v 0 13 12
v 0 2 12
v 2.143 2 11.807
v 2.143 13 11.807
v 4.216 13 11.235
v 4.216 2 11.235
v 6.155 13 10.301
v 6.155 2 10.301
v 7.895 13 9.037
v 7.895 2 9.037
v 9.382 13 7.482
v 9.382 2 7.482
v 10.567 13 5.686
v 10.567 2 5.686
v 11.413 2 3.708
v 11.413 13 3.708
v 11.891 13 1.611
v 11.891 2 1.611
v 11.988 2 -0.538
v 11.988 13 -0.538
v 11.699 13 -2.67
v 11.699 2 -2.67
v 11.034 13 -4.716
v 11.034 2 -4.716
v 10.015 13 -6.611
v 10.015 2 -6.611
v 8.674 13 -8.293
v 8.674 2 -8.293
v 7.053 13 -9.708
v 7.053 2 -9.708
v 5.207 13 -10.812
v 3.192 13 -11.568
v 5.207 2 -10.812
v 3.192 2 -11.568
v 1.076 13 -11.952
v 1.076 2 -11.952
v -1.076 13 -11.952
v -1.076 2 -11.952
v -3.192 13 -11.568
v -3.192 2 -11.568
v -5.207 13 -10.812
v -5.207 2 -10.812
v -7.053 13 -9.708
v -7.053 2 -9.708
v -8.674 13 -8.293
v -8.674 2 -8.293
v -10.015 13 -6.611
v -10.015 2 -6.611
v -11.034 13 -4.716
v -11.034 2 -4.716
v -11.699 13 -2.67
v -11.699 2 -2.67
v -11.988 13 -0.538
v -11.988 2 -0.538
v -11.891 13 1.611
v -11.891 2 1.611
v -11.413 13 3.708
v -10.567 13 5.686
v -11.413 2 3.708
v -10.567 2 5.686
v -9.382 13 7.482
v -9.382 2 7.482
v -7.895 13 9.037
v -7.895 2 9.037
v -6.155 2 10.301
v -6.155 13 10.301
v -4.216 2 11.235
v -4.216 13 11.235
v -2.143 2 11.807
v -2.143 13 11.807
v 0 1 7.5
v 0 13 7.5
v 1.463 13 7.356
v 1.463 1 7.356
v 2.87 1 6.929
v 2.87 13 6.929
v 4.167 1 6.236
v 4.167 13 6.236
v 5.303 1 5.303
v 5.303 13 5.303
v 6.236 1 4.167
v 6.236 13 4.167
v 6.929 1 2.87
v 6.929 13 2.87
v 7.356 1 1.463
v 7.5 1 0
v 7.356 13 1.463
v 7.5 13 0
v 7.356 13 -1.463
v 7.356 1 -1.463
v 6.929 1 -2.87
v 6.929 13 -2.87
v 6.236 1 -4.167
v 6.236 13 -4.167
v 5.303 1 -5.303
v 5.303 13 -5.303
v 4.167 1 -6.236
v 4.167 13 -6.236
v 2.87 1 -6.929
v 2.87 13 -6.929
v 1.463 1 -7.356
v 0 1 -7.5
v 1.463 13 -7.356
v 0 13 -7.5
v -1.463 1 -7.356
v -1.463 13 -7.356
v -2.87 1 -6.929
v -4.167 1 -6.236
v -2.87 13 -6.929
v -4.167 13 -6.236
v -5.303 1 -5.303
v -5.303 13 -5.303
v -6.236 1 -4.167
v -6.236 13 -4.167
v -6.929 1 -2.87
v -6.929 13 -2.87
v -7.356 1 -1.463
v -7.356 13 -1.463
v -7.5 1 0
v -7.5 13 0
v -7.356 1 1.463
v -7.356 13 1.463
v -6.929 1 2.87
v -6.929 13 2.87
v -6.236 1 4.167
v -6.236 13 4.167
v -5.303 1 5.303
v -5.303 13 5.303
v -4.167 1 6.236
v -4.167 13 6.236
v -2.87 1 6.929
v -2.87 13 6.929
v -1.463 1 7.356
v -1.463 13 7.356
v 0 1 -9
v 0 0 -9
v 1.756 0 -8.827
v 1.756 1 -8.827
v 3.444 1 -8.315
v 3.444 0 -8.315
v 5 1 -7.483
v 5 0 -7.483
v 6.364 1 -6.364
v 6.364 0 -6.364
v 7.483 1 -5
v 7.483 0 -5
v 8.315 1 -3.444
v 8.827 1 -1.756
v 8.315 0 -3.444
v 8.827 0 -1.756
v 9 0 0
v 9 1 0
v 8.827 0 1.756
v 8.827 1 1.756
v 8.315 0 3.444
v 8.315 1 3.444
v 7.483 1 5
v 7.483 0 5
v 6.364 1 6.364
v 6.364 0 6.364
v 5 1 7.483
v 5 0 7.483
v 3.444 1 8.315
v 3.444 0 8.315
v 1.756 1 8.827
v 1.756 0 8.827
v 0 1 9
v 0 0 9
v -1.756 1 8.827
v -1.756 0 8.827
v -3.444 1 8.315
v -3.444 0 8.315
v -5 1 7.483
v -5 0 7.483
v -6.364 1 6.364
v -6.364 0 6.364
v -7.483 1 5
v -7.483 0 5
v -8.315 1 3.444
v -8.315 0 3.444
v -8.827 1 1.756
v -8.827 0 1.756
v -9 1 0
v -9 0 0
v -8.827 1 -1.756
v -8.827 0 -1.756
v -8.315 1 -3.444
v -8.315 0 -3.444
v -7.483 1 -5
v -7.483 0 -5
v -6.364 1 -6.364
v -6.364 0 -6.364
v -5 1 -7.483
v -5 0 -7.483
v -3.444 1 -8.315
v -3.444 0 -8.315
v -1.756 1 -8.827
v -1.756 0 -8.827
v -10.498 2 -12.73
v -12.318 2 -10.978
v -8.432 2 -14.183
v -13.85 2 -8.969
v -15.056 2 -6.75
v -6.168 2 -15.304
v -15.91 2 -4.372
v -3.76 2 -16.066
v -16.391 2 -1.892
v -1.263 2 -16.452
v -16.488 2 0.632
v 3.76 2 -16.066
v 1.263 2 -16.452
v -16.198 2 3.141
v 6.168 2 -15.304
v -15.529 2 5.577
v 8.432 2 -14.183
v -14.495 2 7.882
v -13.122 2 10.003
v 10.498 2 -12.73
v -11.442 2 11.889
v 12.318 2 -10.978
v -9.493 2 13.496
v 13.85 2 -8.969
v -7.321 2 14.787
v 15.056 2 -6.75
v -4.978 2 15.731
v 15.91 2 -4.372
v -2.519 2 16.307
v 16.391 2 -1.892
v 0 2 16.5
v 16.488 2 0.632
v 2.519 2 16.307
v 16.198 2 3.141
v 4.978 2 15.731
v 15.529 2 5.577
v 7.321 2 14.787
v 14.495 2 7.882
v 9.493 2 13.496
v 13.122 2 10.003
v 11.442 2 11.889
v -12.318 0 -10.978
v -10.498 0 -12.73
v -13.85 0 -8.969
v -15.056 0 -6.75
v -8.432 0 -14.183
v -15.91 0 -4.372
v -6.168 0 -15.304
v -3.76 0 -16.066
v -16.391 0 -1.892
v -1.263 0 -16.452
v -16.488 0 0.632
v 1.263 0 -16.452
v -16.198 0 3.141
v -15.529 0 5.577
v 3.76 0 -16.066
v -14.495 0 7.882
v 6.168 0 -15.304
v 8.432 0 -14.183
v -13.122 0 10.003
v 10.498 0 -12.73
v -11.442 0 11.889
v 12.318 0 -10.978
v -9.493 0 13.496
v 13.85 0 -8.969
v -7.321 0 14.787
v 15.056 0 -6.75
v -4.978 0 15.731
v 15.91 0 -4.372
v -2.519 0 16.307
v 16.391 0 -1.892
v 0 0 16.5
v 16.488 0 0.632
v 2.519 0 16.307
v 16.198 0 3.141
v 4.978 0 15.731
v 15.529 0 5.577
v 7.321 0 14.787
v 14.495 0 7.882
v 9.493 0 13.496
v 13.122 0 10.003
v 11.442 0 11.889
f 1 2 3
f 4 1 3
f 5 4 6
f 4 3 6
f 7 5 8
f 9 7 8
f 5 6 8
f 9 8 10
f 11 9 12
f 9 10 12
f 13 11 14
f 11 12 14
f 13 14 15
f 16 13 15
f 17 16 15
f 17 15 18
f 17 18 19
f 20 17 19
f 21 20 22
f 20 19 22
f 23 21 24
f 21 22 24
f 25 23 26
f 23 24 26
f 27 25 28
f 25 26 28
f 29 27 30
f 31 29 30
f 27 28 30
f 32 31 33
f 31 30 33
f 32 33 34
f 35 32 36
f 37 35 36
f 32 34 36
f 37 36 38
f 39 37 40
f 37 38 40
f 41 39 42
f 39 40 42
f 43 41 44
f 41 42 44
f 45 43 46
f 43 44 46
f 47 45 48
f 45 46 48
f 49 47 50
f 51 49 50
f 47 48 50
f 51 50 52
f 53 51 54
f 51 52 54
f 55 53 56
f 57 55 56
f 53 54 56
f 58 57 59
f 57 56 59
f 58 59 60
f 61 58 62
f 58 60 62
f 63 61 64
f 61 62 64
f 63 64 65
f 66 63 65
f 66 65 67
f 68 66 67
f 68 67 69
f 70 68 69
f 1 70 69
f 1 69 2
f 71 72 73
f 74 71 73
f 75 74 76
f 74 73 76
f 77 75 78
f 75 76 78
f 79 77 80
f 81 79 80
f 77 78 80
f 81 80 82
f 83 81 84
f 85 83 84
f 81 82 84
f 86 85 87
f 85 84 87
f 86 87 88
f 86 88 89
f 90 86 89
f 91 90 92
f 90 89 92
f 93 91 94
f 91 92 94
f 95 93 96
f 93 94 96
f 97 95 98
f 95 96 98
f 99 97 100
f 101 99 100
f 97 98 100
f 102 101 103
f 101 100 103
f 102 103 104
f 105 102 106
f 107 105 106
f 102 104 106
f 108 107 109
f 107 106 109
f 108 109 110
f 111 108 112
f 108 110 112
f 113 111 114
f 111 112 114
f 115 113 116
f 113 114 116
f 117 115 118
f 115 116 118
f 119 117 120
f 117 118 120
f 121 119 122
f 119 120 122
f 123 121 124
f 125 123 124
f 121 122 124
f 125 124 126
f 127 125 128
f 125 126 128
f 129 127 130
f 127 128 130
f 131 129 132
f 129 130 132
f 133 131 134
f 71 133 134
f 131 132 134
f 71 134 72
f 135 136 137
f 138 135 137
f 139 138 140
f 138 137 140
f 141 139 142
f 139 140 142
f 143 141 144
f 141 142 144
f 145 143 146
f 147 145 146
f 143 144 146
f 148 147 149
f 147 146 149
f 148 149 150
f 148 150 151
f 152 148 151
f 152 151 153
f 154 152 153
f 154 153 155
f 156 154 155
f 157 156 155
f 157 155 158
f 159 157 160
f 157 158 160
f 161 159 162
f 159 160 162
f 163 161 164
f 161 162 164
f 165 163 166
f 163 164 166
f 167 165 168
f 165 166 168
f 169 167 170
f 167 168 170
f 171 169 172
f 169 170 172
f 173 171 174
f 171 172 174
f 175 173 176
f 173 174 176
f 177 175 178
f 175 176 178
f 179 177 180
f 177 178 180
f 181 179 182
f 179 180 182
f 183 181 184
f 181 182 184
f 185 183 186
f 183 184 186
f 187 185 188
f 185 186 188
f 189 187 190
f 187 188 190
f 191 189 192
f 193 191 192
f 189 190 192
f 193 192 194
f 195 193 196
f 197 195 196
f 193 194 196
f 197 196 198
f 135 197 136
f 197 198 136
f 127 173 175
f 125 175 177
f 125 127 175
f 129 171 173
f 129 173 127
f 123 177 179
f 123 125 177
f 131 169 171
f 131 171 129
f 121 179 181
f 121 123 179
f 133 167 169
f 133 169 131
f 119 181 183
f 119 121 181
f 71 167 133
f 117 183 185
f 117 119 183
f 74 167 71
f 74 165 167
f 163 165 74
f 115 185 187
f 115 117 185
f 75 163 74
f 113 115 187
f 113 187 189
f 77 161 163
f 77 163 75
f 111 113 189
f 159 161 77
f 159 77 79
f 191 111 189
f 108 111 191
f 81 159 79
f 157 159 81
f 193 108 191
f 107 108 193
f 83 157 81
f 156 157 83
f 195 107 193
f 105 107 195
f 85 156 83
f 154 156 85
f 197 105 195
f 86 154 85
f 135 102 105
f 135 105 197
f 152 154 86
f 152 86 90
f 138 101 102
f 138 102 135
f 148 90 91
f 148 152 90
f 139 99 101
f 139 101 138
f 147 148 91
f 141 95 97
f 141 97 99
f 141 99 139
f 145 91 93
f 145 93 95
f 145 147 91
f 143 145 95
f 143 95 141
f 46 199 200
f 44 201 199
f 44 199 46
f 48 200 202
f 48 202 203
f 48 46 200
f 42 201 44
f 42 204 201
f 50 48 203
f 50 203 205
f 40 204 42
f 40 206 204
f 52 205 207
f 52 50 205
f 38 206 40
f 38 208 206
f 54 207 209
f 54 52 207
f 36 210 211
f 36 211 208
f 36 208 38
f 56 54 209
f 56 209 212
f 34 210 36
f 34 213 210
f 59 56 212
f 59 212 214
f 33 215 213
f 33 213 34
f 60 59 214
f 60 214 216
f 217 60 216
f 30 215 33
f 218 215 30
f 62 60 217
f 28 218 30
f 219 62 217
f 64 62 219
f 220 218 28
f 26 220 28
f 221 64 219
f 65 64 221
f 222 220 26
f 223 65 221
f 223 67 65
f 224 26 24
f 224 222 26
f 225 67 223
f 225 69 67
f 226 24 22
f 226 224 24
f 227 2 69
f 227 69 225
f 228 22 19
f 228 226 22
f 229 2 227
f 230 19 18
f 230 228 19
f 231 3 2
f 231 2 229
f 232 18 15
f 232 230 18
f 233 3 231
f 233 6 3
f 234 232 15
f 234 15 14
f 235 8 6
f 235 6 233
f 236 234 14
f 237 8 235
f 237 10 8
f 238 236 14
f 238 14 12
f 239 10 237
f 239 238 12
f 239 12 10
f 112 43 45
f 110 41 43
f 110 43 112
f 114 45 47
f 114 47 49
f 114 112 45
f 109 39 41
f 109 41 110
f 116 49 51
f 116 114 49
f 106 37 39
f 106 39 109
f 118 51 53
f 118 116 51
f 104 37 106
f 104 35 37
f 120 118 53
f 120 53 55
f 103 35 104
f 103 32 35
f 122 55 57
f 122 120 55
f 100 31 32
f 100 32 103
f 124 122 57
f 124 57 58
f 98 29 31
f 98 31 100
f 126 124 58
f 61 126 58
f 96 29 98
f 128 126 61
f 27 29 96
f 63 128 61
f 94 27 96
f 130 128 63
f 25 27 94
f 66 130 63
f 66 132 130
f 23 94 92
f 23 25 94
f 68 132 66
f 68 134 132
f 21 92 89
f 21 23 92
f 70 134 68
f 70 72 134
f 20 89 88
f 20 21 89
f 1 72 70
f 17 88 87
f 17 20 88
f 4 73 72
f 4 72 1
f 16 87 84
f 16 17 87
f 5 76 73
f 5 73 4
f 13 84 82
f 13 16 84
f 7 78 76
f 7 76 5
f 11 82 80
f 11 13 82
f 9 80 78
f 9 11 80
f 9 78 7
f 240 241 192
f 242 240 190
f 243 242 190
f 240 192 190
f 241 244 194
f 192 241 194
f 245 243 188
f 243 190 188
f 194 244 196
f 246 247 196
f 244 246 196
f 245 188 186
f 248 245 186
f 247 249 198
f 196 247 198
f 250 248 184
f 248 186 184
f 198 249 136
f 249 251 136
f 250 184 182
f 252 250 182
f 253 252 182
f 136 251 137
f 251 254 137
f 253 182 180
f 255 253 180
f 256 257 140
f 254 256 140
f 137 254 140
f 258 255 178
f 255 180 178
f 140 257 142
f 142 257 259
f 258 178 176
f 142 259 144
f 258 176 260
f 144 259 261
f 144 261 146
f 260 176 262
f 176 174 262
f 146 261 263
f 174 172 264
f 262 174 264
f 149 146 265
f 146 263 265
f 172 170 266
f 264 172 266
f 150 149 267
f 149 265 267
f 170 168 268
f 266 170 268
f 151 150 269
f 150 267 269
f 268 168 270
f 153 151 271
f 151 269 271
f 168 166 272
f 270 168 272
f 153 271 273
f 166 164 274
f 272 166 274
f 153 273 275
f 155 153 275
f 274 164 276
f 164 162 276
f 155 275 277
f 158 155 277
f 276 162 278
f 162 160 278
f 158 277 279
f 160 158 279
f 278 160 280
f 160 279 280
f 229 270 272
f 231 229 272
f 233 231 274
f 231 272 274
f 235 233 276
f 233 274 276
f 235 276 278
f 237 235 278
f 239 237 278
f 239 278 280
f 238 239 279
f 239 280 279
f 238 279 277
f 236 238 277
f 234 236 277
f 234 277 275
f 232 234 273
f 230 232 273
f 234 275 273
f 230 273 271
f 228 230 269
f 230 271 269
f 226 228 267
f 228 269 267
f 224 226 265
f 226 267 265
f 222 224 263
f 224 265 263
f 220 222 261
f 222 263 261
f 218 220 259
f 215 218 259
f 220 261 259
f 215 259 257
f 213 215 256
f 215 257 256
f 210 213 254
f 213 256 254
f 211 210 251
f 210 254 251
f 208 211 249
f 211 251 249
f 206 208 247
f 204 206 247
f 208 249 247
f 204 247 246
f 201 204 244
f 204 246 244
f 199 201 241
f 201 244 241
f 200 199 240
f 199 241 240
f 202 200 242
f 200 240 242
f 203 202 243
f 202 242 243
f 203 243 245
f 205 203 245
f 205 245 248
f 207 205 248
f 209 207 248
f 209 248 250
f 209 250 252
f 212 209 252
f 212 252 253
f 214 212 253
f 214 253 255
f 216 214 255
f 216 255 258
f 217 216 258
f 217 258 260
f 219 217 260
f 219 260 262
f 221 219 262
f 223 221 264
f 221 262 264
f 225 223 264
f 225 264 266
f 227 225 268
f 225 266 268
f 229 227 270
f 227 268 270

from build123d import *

# Parameters (mm, degrees)
SKETCH1_R           = 16.5
BOSS_EXTRUDE1_DEPTH = 2
SKETCH2_R           = 12
BOSS_EXTRUDE2_DEPTH = 11
SKETCH3_R           = 9
CUT_EXTRUDE1_DEPTH  = 1
SKETCH4_R           = 7.5
CUT_EXTRUDE2_DEPTH  = 12


with BuildPart() as part:
    # Sketch1 → Boss-Extrude1 (new body)
    with BuildSketch(Plane(origin=(0, 0, 0), x_dir=(1, 0, 0), z_dir=(0, 1, 0))):
        with Locations(Location((0, 0, 0), (0, 0, 270))):
            Circle(SKETCH1_R)
    extrude(amount=BOSS_EXTRUDE1_DEPTH)

    # Sketch2 → Boss-Extrude2 (add)
    with BuildSketch(Plane(origin=(0, 2, 0), x_dir=(1, 0, 0), z_dir=(0, 1, 0))):
        with Locations(Location((0, 0, 0), (0, 0, 270))):
            Circle(SKETCH2_R)
    extrude(amount=BOSS_EXTRUDE2_DEPTH)

    # Sketch3 → Cut-Extrude1 (cut)
    with BuildSketch(Plane.XZ):
        with Locations(Location((0, 0, 0), (0, 0, 270))):
            Circle(SKETCH3_R)
    extrude(amount=-CUT_EXTRUDE1_DEPTH, mode=Mode.SUBTRACT)

    # Sketch4 → Cut-Extrude2 (cut)
    with BuildSketch(Plane(origin=(0, 13, 0), x_dir=(1, 0, 0), z_dir=(0, 1, 0))):
        with Locations(Location((0, 0, 0), (0, 0, 270))):
            Circle(SKETCH4_R)
    extrude(amount=-CUT_EXTRUDE2_DEPTH, mode=Mode.SUBTRACT)


solid = part.part
